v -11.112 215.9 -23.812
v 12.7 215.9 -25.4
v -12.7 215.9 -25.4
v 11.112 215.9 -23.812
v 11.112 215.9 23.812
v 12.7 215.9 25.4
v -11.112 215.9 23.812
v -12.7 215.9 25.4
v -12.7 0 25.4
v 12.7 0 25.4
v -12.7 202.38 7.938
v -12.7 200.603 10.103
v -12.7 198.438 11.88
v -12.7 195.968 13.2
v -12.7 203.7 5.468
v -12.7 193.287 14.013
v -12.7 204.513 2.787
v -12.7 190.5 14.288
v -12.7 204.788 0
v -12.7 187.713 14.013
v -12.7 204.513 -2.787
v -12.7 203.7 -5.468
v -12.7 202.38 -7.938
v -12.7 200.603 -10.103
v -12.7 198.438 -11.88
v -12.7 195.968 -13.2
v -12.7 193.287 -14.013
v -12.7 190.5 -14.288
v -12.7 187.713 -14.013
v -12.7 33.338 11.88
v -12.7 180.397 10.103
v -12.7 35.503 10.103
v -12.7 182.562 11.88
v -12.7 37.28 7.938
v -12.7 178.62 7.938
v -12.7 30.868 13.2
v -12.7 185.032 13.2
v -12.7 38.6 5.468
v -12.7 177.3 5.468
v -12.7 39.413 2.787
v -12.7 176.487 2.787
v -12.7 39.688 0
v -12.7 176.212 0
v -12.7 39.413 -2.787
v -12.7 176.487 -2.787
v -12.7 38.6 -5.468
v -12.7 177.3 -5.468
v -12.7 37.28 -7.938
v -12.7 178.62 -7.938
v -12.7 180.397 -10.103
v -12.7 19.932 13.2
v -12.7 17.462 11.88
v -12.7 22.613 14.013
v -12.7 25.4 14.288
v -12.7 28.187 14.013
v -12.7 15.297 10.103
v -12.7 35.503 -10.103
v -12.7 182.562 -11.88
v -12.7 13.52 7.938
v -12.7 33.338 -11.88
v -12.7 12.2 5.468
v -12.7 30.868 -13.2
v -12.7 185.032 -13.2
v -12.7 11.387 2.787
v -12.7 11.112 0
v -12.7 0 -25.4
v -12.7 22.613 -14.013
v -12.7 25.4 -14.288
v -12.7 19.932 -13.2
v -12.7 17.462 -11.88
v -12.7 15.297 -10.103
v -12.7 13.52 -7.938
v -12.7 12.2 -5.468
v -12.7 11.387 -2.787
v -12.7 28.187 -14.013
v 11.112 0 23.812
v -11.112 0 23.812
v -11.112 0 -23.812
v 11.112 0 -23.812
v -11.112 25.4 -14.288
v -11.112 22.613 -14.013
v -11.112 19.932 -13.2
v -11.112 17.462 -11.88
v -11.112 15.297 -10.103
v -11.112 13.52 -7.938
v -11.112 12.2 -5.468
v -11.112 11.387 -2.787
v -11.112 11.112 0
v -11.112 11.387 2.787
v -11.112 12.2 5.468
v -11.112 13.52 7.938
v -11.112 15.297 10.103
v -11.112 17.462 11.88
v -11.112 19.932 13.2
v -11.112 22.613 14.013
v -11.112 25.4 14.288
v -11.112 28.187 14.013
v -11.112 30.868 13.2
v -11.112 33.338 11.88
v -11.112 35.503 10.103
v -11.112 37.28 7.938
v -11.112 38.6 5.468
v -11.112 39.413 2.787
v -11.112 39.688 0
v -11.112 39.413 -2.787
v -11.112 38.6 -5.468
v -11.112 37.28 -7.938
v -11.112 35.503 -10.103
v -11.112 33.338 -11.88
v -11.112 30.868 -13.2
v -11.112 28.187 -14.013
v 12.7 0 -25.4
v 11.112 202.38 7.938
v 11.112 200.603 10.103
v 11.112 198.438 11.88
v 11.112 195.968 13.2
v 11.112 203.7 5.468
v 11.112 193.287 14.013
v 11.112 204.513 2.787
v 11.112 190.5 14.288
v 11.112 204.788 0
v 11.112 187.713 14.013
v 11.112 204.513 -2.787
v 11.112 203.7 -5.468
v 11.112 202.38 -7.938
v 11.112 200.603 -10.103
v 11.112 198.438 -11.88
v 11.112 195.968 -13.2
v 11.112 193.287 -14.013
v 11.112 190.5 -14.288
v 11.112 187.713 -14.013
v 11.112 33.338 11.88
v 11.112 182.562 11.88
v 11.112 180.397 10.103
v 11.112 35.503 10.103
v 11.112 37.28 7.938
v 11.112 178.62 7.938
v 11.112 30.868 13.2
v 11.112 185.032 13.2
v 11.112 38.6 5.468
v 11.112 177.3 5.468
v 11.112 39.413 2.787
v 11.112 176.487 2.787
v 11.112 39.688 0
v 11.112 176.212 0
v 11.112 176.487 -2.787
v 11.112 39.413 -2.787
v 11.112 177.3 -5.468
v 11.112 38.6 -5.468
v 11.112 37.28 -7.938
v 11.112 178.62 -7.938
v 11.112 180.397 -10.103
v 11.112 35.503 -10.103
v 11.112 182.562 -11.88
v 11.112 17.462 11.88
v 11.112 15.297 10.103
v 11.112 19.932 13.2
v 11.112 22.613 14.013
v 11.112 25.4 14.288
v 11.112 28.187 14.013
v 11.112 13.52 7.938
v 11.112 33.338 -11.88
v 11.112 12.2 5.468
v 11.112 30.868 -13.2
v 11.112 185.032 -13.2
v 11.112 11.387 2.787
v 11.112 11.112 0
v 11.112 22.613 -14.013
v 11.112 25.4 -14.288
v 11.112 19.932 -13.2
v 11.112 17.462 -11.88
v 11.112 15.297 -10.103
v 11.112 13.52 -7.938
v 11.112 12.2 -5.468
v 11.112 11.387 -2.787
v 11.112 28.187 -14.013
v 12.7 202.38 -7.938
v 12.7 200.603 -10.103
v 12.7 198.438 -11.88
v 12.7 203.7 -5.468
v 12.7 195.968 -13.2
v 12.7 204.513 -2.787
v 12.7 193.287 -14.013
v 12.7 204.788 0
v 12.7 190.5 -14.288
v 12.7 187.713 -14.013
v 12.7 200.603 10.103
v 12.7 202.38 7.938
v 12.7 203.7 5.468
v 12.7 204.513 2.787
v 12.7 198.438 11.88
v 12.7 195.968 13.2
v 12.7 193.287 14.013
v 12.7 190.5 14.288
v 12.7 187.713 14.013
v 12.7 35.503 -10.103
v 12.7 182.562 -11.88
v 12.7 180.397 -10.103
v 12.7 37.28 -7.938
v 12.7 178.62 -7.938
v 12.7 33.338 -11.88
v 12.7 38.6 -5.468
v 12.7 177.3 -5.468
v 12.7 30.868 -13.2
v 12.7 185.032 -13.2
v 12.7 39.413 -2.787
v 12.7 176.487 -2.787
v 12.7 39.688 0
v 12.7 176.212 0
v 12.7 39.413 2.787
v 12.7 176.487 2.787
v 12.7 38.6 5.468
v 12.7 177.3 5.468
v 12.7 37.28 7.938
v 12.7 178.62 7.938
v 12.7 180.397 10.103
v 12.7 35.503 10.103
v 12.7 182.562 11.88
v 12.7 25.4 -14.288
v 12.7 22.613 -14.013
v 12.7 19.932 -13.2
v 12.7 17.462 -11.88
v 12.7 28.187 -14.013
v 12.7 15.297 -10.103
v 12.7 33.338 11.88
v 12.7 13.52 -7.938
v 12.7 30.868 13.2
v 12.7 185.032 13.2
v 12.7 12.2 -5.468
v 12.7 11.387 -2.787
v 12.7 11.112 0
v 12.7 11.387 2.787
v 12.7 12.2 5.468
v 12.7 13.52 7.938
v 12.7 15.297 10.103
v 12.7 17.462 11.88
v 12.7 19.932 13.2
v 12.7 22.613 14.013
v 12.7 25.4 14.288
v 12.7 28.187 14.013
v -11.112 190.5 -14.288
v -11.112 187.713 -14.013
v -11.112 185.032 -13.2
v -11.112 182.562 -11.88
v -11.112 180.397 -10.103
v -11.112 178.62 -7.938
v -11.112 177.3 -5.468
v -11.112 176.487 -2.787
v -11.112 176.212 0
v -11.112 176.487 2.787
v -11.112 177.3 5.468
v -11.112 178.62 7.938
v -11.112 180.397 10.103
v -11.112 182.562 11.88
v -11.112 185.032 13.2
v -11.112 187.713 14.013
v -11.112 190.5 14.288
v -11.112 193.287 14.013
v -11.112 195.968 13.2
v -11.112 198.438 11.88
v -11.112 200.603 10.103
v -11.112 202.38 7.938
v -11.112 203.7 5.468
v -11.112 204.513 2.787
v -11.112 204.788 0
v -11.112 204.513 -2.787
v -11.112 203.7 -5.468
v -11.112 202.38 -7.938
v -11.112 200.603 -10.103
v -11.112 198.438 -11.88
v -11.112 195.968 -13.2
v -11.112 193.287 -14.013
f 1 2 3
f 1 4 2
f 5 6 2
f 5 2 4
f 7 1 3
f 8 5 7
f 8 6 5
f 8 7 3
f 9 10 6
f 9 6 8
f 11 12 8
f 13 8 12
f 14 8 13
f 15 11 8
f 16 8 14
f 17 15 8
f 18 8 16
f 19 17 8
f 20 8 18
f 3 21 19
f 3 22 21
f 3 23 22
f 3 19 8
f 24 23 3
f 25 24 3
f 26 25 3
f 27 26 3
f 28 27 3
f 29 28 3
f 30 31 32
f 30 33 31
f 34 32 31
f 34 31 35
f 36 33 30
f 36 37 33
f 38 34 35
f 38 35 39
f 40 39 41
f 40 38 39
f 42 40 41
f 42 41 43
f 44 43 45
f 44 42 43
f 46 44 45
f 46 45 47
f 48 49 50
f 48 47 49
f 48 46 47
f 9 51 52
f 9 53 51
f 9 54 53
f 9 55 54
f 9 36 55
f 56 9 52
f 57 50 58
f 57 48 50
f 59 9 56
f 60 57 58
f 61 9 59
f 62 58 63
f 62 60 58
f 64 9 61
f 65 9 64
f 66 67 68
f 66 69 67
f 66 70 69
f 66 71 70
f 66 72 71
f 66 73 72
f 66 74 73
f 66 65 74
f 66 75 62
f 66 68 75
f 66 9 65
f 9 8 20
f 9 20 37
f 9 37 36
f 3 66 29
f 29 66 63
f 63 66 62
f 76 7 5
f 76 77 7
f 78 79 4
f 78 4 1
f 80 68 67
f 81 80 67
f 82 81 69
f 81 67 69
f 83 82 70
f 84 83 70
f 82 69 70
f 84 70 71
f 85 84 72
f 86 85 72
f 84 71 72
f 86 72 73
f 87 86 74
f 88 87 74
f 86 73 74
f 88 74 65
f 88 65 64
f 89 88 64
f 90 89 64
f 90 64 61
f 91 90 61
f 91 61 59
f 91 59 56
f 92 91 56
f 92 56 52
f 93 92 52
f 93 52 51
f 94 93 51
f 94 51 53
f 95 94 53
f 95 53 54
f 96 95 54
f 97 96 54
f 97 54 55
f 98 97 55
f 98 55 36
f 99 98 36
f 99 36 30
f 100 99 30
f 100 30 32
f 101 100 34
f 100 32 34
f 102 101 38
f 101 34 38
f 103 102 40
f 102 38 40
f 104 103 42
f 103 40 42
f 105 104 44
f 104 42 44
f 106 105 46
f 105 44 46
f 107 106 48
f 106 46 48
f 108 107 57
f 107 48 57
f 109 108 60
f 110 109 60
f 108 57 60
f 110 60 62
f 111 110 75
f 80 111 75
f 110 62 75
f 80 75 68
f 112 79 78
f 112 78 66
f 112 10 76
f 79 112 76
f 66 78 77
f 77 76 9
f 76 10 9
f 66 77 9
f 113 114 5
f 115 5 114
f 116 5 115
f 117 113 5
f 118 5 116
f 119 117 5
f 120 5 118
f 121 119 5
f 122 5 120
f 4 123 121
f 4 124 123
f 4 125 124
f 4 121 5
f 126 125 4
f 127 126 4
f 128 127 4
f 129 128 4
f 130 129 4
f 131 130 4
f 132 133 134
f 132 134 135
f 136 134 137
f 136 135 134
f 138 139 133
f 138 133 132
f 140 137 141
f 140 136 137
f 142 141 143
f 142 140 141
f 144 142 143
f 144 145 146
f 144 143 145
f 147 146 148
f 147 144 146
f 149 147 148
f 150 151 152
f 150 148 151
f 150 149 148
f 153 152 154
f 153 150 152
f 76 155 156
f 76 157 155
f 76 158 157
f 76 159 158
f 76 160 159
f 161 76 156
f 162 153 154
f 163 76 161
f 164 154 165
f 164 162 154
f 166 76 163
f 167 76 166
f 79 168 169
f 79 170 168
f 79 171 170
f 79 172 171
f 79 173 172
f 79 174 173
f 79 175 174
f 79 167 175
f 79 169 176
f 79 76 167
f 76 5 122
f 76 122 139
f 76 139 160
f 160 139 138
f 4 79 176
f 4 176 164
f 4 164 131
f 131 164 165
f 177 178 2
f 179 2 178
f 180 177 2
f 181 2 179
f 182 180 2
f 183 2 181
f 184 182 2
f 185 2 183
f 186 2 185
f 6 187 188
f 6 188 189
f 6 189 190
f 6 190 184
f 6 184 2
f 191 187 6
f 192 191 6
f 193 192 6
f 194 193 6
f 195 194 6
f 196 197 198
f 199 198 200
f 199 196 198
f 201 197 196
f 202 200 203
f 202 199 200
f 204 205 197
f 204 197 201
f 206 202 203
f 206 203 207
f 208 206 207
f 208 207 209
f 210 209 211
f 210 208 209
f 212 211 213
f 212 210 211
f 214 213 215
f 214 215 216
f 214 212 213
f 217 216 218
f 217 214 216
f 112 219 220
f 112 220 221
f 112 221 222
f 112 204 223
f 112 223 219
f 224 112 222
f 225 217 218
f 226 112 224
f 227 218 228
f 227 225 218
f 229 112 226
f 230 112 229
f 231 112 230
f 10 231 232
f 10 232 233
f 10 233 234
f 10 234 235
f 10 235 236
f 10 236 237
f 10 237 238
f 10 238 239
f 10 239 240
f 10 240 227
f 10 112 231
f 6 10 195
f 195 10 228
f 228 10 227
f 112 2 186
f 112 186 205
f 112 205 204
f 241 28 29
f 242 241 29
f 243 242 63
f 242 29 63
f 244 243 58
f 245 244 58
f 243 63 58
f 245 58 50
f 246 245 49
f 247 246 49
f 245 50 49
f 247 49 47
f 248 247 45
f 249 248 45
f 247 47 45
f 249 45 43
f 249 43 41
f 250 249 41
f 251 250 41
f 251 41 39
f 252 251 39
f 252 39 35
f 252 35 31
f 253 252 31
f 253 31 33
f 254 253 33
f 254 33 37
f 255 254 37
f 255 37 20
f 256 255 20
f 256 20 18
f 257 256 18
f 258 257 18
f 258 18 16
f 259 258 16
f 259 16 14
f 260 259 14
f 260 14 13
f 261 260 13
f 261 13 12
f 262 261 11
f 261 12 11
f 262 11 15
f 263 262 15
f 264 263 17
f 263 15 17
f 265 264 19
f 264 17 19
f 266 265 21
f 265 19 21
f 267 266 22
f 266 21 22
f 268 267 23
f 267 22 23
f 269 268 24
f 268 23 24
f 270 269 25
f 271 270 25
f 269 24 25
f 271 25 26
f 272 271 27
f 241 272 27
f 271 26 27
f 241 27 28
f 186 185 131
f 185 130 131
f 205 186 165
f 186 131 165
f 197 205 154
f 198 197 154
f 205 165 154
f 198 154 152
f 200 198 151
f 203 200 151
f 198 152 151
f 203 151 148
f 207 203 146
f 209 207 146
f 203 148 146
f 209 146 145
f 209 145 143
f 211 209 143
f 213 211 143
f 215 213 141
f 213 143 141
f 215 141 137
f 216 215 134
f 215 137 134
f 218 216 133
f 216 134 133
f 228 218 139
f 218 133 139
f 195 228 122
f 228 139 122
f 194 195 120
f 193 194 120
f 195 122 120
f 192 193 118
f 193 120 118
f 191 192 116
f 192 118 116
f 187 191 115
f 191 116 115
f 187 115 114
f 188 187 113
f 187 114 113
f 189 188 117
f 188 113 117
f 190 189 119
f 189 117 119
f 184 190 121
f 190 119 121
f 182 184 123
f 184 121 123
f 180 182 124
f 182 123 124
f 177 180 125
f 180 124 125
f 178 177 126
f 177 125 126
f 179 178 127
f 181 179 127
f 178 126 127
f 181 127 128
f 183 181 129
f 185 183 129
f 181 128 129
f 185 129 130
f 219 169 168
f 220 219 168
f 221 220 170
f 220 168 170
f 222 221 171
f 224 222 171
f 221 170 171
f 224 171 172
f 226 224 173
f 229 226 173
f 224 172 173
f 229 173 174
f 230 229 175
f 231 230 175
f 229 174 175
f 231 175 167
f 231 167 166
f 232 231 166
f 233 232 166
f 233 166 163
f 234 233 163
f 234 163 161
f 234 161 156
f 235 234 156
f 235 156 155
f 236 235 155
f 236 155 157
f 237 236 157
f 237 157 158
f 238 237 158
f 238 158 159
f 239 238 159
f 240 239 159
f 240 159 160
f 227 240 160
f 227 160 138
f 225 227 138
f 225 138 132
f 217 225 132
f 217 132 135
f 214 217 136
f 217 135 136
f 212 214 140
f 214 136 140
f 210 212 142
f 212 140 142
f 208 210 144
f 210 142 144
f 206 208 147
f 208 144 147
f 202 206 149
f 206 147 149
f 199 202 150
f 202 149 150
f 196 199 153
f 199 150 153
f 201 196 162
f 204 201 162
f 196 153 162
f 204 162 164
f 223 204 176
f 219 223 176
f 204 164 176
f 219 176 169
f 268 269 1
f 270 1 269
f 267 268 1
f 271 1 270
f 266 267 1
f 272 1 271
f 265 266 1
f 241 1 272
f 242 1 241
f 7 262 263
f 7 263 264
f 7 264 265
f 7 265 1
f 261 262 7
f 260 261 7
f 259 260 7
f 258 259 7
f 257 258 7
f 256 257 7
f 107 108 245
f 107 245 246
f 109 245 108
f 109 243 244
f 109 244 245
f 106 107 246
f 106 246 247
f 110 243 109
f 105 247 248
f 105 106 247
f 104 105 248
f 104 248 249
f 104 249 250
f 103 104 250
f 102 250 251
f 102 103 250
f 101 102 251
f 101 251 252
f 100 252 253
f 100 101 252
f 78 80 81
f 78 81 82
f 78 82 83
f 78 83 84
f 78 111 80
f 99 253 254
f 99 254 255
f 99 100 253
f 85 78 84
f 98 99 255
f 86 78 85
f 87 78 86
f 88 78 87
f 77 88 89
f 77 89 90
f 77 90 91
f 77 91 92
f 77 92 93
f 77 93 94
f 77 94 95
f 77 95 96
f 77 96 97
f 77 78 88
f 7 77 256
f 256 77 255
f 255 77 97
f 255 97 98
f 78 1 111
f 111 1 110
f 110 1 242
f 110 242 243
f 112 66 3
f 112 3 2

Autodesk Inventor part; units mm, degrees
ref_plane "YZ Plane" through (0, 0, 0) normal (1, 0, 0) x (0, 1, 0)
ref_plane "XZ Plane" through (0, 0, 0) normal (0, 1, 0) x (-1, 0, 0)
ref_plane "XY Plane" through (0, 0, 0) normal (0, 0, 1) x (1, 0, 0)
sketch "Sketch1" plane through (0, 0, 0) normal (0, 1, 0) x (-1, 0, 0)
  line L0 (-12.7, 25.4) -> (12.7, 25.4)
  line L1 (12.7, 25.4) -> (12.7, -25.4)
  line L2 (12.7, -25.4) -> (-12.7, -25.4)
  line L3 (-12.7, -25.4) -> (-12.7, 25.4)
  line L4 (-12.7, 25.4) -> (12.7, -25.4) construction
  line L5 (12.7, 25.4) -> (-12.7, -25.4) construction
  line L6 (11.1125, 23.8125) -> (-11.1125, 23.8125)
  line L7 (-11.1125, 23.8125) -> (-11.1125, -23.8125)
  line L8 (-11.1125, -23.8125) -> (11.1125, -23.8125)
  line L9 (11.1125, -23.8125) -> (11.1125, 23.8125)
  line L10 (11.1125, 23.8125) -> (-11.1125, -23.8125) construction
  line L11 (-11.1125, 23.8125) -> (11.1125, -23.8125) construction
  point P0 (0, 0)
  dimension "d0" = 25.4
  dimension "d1" = 50.8
  dimension "d2" = 22.225
  dimension "d3" = 47.625
extrude "Extrusion1" add sketch "Sketch1" along normal blind 215.9
sketch "Sketch2" plane through (12.7, 0, 25.4) normal (1, 0, 0) x (0, 0, -1)
  line L0 (0, 215.9) -> (50.8, 215.9) projected
  line L1 (0, 0) -> (0, 215.9) projected
  point P0 (25.4, 0)
  point P1 (25.4, 190.5)
  dimension "d21" = 25.4
  dimension "d24" = 190.5
hole "Hole1" at (12.7, 190.5, 0) direction (-1, 0, 0) diameter 28.575 end through all
sketch "Sketch3" plane through (12.7, 0, 25.4) normal (1, 0, 0) x (0, 0, -1)
  line L0 (50.8, 0) -> (50.8, 215.9) projected
  line L1 (0, 0) -> (50.8, 0) projected
  point P0 (25.4, 0)
  point P1 (25.4, 25.4)
  dimension "d22" = 25.4
  dimension "d23" = 25.4
hole "Hole2" at (12.7, 25.4, 0) direction (-1, 0, 0) diameter 28.575 end through all
properties part number "2x1 Front" material "Aluminum 6061"
